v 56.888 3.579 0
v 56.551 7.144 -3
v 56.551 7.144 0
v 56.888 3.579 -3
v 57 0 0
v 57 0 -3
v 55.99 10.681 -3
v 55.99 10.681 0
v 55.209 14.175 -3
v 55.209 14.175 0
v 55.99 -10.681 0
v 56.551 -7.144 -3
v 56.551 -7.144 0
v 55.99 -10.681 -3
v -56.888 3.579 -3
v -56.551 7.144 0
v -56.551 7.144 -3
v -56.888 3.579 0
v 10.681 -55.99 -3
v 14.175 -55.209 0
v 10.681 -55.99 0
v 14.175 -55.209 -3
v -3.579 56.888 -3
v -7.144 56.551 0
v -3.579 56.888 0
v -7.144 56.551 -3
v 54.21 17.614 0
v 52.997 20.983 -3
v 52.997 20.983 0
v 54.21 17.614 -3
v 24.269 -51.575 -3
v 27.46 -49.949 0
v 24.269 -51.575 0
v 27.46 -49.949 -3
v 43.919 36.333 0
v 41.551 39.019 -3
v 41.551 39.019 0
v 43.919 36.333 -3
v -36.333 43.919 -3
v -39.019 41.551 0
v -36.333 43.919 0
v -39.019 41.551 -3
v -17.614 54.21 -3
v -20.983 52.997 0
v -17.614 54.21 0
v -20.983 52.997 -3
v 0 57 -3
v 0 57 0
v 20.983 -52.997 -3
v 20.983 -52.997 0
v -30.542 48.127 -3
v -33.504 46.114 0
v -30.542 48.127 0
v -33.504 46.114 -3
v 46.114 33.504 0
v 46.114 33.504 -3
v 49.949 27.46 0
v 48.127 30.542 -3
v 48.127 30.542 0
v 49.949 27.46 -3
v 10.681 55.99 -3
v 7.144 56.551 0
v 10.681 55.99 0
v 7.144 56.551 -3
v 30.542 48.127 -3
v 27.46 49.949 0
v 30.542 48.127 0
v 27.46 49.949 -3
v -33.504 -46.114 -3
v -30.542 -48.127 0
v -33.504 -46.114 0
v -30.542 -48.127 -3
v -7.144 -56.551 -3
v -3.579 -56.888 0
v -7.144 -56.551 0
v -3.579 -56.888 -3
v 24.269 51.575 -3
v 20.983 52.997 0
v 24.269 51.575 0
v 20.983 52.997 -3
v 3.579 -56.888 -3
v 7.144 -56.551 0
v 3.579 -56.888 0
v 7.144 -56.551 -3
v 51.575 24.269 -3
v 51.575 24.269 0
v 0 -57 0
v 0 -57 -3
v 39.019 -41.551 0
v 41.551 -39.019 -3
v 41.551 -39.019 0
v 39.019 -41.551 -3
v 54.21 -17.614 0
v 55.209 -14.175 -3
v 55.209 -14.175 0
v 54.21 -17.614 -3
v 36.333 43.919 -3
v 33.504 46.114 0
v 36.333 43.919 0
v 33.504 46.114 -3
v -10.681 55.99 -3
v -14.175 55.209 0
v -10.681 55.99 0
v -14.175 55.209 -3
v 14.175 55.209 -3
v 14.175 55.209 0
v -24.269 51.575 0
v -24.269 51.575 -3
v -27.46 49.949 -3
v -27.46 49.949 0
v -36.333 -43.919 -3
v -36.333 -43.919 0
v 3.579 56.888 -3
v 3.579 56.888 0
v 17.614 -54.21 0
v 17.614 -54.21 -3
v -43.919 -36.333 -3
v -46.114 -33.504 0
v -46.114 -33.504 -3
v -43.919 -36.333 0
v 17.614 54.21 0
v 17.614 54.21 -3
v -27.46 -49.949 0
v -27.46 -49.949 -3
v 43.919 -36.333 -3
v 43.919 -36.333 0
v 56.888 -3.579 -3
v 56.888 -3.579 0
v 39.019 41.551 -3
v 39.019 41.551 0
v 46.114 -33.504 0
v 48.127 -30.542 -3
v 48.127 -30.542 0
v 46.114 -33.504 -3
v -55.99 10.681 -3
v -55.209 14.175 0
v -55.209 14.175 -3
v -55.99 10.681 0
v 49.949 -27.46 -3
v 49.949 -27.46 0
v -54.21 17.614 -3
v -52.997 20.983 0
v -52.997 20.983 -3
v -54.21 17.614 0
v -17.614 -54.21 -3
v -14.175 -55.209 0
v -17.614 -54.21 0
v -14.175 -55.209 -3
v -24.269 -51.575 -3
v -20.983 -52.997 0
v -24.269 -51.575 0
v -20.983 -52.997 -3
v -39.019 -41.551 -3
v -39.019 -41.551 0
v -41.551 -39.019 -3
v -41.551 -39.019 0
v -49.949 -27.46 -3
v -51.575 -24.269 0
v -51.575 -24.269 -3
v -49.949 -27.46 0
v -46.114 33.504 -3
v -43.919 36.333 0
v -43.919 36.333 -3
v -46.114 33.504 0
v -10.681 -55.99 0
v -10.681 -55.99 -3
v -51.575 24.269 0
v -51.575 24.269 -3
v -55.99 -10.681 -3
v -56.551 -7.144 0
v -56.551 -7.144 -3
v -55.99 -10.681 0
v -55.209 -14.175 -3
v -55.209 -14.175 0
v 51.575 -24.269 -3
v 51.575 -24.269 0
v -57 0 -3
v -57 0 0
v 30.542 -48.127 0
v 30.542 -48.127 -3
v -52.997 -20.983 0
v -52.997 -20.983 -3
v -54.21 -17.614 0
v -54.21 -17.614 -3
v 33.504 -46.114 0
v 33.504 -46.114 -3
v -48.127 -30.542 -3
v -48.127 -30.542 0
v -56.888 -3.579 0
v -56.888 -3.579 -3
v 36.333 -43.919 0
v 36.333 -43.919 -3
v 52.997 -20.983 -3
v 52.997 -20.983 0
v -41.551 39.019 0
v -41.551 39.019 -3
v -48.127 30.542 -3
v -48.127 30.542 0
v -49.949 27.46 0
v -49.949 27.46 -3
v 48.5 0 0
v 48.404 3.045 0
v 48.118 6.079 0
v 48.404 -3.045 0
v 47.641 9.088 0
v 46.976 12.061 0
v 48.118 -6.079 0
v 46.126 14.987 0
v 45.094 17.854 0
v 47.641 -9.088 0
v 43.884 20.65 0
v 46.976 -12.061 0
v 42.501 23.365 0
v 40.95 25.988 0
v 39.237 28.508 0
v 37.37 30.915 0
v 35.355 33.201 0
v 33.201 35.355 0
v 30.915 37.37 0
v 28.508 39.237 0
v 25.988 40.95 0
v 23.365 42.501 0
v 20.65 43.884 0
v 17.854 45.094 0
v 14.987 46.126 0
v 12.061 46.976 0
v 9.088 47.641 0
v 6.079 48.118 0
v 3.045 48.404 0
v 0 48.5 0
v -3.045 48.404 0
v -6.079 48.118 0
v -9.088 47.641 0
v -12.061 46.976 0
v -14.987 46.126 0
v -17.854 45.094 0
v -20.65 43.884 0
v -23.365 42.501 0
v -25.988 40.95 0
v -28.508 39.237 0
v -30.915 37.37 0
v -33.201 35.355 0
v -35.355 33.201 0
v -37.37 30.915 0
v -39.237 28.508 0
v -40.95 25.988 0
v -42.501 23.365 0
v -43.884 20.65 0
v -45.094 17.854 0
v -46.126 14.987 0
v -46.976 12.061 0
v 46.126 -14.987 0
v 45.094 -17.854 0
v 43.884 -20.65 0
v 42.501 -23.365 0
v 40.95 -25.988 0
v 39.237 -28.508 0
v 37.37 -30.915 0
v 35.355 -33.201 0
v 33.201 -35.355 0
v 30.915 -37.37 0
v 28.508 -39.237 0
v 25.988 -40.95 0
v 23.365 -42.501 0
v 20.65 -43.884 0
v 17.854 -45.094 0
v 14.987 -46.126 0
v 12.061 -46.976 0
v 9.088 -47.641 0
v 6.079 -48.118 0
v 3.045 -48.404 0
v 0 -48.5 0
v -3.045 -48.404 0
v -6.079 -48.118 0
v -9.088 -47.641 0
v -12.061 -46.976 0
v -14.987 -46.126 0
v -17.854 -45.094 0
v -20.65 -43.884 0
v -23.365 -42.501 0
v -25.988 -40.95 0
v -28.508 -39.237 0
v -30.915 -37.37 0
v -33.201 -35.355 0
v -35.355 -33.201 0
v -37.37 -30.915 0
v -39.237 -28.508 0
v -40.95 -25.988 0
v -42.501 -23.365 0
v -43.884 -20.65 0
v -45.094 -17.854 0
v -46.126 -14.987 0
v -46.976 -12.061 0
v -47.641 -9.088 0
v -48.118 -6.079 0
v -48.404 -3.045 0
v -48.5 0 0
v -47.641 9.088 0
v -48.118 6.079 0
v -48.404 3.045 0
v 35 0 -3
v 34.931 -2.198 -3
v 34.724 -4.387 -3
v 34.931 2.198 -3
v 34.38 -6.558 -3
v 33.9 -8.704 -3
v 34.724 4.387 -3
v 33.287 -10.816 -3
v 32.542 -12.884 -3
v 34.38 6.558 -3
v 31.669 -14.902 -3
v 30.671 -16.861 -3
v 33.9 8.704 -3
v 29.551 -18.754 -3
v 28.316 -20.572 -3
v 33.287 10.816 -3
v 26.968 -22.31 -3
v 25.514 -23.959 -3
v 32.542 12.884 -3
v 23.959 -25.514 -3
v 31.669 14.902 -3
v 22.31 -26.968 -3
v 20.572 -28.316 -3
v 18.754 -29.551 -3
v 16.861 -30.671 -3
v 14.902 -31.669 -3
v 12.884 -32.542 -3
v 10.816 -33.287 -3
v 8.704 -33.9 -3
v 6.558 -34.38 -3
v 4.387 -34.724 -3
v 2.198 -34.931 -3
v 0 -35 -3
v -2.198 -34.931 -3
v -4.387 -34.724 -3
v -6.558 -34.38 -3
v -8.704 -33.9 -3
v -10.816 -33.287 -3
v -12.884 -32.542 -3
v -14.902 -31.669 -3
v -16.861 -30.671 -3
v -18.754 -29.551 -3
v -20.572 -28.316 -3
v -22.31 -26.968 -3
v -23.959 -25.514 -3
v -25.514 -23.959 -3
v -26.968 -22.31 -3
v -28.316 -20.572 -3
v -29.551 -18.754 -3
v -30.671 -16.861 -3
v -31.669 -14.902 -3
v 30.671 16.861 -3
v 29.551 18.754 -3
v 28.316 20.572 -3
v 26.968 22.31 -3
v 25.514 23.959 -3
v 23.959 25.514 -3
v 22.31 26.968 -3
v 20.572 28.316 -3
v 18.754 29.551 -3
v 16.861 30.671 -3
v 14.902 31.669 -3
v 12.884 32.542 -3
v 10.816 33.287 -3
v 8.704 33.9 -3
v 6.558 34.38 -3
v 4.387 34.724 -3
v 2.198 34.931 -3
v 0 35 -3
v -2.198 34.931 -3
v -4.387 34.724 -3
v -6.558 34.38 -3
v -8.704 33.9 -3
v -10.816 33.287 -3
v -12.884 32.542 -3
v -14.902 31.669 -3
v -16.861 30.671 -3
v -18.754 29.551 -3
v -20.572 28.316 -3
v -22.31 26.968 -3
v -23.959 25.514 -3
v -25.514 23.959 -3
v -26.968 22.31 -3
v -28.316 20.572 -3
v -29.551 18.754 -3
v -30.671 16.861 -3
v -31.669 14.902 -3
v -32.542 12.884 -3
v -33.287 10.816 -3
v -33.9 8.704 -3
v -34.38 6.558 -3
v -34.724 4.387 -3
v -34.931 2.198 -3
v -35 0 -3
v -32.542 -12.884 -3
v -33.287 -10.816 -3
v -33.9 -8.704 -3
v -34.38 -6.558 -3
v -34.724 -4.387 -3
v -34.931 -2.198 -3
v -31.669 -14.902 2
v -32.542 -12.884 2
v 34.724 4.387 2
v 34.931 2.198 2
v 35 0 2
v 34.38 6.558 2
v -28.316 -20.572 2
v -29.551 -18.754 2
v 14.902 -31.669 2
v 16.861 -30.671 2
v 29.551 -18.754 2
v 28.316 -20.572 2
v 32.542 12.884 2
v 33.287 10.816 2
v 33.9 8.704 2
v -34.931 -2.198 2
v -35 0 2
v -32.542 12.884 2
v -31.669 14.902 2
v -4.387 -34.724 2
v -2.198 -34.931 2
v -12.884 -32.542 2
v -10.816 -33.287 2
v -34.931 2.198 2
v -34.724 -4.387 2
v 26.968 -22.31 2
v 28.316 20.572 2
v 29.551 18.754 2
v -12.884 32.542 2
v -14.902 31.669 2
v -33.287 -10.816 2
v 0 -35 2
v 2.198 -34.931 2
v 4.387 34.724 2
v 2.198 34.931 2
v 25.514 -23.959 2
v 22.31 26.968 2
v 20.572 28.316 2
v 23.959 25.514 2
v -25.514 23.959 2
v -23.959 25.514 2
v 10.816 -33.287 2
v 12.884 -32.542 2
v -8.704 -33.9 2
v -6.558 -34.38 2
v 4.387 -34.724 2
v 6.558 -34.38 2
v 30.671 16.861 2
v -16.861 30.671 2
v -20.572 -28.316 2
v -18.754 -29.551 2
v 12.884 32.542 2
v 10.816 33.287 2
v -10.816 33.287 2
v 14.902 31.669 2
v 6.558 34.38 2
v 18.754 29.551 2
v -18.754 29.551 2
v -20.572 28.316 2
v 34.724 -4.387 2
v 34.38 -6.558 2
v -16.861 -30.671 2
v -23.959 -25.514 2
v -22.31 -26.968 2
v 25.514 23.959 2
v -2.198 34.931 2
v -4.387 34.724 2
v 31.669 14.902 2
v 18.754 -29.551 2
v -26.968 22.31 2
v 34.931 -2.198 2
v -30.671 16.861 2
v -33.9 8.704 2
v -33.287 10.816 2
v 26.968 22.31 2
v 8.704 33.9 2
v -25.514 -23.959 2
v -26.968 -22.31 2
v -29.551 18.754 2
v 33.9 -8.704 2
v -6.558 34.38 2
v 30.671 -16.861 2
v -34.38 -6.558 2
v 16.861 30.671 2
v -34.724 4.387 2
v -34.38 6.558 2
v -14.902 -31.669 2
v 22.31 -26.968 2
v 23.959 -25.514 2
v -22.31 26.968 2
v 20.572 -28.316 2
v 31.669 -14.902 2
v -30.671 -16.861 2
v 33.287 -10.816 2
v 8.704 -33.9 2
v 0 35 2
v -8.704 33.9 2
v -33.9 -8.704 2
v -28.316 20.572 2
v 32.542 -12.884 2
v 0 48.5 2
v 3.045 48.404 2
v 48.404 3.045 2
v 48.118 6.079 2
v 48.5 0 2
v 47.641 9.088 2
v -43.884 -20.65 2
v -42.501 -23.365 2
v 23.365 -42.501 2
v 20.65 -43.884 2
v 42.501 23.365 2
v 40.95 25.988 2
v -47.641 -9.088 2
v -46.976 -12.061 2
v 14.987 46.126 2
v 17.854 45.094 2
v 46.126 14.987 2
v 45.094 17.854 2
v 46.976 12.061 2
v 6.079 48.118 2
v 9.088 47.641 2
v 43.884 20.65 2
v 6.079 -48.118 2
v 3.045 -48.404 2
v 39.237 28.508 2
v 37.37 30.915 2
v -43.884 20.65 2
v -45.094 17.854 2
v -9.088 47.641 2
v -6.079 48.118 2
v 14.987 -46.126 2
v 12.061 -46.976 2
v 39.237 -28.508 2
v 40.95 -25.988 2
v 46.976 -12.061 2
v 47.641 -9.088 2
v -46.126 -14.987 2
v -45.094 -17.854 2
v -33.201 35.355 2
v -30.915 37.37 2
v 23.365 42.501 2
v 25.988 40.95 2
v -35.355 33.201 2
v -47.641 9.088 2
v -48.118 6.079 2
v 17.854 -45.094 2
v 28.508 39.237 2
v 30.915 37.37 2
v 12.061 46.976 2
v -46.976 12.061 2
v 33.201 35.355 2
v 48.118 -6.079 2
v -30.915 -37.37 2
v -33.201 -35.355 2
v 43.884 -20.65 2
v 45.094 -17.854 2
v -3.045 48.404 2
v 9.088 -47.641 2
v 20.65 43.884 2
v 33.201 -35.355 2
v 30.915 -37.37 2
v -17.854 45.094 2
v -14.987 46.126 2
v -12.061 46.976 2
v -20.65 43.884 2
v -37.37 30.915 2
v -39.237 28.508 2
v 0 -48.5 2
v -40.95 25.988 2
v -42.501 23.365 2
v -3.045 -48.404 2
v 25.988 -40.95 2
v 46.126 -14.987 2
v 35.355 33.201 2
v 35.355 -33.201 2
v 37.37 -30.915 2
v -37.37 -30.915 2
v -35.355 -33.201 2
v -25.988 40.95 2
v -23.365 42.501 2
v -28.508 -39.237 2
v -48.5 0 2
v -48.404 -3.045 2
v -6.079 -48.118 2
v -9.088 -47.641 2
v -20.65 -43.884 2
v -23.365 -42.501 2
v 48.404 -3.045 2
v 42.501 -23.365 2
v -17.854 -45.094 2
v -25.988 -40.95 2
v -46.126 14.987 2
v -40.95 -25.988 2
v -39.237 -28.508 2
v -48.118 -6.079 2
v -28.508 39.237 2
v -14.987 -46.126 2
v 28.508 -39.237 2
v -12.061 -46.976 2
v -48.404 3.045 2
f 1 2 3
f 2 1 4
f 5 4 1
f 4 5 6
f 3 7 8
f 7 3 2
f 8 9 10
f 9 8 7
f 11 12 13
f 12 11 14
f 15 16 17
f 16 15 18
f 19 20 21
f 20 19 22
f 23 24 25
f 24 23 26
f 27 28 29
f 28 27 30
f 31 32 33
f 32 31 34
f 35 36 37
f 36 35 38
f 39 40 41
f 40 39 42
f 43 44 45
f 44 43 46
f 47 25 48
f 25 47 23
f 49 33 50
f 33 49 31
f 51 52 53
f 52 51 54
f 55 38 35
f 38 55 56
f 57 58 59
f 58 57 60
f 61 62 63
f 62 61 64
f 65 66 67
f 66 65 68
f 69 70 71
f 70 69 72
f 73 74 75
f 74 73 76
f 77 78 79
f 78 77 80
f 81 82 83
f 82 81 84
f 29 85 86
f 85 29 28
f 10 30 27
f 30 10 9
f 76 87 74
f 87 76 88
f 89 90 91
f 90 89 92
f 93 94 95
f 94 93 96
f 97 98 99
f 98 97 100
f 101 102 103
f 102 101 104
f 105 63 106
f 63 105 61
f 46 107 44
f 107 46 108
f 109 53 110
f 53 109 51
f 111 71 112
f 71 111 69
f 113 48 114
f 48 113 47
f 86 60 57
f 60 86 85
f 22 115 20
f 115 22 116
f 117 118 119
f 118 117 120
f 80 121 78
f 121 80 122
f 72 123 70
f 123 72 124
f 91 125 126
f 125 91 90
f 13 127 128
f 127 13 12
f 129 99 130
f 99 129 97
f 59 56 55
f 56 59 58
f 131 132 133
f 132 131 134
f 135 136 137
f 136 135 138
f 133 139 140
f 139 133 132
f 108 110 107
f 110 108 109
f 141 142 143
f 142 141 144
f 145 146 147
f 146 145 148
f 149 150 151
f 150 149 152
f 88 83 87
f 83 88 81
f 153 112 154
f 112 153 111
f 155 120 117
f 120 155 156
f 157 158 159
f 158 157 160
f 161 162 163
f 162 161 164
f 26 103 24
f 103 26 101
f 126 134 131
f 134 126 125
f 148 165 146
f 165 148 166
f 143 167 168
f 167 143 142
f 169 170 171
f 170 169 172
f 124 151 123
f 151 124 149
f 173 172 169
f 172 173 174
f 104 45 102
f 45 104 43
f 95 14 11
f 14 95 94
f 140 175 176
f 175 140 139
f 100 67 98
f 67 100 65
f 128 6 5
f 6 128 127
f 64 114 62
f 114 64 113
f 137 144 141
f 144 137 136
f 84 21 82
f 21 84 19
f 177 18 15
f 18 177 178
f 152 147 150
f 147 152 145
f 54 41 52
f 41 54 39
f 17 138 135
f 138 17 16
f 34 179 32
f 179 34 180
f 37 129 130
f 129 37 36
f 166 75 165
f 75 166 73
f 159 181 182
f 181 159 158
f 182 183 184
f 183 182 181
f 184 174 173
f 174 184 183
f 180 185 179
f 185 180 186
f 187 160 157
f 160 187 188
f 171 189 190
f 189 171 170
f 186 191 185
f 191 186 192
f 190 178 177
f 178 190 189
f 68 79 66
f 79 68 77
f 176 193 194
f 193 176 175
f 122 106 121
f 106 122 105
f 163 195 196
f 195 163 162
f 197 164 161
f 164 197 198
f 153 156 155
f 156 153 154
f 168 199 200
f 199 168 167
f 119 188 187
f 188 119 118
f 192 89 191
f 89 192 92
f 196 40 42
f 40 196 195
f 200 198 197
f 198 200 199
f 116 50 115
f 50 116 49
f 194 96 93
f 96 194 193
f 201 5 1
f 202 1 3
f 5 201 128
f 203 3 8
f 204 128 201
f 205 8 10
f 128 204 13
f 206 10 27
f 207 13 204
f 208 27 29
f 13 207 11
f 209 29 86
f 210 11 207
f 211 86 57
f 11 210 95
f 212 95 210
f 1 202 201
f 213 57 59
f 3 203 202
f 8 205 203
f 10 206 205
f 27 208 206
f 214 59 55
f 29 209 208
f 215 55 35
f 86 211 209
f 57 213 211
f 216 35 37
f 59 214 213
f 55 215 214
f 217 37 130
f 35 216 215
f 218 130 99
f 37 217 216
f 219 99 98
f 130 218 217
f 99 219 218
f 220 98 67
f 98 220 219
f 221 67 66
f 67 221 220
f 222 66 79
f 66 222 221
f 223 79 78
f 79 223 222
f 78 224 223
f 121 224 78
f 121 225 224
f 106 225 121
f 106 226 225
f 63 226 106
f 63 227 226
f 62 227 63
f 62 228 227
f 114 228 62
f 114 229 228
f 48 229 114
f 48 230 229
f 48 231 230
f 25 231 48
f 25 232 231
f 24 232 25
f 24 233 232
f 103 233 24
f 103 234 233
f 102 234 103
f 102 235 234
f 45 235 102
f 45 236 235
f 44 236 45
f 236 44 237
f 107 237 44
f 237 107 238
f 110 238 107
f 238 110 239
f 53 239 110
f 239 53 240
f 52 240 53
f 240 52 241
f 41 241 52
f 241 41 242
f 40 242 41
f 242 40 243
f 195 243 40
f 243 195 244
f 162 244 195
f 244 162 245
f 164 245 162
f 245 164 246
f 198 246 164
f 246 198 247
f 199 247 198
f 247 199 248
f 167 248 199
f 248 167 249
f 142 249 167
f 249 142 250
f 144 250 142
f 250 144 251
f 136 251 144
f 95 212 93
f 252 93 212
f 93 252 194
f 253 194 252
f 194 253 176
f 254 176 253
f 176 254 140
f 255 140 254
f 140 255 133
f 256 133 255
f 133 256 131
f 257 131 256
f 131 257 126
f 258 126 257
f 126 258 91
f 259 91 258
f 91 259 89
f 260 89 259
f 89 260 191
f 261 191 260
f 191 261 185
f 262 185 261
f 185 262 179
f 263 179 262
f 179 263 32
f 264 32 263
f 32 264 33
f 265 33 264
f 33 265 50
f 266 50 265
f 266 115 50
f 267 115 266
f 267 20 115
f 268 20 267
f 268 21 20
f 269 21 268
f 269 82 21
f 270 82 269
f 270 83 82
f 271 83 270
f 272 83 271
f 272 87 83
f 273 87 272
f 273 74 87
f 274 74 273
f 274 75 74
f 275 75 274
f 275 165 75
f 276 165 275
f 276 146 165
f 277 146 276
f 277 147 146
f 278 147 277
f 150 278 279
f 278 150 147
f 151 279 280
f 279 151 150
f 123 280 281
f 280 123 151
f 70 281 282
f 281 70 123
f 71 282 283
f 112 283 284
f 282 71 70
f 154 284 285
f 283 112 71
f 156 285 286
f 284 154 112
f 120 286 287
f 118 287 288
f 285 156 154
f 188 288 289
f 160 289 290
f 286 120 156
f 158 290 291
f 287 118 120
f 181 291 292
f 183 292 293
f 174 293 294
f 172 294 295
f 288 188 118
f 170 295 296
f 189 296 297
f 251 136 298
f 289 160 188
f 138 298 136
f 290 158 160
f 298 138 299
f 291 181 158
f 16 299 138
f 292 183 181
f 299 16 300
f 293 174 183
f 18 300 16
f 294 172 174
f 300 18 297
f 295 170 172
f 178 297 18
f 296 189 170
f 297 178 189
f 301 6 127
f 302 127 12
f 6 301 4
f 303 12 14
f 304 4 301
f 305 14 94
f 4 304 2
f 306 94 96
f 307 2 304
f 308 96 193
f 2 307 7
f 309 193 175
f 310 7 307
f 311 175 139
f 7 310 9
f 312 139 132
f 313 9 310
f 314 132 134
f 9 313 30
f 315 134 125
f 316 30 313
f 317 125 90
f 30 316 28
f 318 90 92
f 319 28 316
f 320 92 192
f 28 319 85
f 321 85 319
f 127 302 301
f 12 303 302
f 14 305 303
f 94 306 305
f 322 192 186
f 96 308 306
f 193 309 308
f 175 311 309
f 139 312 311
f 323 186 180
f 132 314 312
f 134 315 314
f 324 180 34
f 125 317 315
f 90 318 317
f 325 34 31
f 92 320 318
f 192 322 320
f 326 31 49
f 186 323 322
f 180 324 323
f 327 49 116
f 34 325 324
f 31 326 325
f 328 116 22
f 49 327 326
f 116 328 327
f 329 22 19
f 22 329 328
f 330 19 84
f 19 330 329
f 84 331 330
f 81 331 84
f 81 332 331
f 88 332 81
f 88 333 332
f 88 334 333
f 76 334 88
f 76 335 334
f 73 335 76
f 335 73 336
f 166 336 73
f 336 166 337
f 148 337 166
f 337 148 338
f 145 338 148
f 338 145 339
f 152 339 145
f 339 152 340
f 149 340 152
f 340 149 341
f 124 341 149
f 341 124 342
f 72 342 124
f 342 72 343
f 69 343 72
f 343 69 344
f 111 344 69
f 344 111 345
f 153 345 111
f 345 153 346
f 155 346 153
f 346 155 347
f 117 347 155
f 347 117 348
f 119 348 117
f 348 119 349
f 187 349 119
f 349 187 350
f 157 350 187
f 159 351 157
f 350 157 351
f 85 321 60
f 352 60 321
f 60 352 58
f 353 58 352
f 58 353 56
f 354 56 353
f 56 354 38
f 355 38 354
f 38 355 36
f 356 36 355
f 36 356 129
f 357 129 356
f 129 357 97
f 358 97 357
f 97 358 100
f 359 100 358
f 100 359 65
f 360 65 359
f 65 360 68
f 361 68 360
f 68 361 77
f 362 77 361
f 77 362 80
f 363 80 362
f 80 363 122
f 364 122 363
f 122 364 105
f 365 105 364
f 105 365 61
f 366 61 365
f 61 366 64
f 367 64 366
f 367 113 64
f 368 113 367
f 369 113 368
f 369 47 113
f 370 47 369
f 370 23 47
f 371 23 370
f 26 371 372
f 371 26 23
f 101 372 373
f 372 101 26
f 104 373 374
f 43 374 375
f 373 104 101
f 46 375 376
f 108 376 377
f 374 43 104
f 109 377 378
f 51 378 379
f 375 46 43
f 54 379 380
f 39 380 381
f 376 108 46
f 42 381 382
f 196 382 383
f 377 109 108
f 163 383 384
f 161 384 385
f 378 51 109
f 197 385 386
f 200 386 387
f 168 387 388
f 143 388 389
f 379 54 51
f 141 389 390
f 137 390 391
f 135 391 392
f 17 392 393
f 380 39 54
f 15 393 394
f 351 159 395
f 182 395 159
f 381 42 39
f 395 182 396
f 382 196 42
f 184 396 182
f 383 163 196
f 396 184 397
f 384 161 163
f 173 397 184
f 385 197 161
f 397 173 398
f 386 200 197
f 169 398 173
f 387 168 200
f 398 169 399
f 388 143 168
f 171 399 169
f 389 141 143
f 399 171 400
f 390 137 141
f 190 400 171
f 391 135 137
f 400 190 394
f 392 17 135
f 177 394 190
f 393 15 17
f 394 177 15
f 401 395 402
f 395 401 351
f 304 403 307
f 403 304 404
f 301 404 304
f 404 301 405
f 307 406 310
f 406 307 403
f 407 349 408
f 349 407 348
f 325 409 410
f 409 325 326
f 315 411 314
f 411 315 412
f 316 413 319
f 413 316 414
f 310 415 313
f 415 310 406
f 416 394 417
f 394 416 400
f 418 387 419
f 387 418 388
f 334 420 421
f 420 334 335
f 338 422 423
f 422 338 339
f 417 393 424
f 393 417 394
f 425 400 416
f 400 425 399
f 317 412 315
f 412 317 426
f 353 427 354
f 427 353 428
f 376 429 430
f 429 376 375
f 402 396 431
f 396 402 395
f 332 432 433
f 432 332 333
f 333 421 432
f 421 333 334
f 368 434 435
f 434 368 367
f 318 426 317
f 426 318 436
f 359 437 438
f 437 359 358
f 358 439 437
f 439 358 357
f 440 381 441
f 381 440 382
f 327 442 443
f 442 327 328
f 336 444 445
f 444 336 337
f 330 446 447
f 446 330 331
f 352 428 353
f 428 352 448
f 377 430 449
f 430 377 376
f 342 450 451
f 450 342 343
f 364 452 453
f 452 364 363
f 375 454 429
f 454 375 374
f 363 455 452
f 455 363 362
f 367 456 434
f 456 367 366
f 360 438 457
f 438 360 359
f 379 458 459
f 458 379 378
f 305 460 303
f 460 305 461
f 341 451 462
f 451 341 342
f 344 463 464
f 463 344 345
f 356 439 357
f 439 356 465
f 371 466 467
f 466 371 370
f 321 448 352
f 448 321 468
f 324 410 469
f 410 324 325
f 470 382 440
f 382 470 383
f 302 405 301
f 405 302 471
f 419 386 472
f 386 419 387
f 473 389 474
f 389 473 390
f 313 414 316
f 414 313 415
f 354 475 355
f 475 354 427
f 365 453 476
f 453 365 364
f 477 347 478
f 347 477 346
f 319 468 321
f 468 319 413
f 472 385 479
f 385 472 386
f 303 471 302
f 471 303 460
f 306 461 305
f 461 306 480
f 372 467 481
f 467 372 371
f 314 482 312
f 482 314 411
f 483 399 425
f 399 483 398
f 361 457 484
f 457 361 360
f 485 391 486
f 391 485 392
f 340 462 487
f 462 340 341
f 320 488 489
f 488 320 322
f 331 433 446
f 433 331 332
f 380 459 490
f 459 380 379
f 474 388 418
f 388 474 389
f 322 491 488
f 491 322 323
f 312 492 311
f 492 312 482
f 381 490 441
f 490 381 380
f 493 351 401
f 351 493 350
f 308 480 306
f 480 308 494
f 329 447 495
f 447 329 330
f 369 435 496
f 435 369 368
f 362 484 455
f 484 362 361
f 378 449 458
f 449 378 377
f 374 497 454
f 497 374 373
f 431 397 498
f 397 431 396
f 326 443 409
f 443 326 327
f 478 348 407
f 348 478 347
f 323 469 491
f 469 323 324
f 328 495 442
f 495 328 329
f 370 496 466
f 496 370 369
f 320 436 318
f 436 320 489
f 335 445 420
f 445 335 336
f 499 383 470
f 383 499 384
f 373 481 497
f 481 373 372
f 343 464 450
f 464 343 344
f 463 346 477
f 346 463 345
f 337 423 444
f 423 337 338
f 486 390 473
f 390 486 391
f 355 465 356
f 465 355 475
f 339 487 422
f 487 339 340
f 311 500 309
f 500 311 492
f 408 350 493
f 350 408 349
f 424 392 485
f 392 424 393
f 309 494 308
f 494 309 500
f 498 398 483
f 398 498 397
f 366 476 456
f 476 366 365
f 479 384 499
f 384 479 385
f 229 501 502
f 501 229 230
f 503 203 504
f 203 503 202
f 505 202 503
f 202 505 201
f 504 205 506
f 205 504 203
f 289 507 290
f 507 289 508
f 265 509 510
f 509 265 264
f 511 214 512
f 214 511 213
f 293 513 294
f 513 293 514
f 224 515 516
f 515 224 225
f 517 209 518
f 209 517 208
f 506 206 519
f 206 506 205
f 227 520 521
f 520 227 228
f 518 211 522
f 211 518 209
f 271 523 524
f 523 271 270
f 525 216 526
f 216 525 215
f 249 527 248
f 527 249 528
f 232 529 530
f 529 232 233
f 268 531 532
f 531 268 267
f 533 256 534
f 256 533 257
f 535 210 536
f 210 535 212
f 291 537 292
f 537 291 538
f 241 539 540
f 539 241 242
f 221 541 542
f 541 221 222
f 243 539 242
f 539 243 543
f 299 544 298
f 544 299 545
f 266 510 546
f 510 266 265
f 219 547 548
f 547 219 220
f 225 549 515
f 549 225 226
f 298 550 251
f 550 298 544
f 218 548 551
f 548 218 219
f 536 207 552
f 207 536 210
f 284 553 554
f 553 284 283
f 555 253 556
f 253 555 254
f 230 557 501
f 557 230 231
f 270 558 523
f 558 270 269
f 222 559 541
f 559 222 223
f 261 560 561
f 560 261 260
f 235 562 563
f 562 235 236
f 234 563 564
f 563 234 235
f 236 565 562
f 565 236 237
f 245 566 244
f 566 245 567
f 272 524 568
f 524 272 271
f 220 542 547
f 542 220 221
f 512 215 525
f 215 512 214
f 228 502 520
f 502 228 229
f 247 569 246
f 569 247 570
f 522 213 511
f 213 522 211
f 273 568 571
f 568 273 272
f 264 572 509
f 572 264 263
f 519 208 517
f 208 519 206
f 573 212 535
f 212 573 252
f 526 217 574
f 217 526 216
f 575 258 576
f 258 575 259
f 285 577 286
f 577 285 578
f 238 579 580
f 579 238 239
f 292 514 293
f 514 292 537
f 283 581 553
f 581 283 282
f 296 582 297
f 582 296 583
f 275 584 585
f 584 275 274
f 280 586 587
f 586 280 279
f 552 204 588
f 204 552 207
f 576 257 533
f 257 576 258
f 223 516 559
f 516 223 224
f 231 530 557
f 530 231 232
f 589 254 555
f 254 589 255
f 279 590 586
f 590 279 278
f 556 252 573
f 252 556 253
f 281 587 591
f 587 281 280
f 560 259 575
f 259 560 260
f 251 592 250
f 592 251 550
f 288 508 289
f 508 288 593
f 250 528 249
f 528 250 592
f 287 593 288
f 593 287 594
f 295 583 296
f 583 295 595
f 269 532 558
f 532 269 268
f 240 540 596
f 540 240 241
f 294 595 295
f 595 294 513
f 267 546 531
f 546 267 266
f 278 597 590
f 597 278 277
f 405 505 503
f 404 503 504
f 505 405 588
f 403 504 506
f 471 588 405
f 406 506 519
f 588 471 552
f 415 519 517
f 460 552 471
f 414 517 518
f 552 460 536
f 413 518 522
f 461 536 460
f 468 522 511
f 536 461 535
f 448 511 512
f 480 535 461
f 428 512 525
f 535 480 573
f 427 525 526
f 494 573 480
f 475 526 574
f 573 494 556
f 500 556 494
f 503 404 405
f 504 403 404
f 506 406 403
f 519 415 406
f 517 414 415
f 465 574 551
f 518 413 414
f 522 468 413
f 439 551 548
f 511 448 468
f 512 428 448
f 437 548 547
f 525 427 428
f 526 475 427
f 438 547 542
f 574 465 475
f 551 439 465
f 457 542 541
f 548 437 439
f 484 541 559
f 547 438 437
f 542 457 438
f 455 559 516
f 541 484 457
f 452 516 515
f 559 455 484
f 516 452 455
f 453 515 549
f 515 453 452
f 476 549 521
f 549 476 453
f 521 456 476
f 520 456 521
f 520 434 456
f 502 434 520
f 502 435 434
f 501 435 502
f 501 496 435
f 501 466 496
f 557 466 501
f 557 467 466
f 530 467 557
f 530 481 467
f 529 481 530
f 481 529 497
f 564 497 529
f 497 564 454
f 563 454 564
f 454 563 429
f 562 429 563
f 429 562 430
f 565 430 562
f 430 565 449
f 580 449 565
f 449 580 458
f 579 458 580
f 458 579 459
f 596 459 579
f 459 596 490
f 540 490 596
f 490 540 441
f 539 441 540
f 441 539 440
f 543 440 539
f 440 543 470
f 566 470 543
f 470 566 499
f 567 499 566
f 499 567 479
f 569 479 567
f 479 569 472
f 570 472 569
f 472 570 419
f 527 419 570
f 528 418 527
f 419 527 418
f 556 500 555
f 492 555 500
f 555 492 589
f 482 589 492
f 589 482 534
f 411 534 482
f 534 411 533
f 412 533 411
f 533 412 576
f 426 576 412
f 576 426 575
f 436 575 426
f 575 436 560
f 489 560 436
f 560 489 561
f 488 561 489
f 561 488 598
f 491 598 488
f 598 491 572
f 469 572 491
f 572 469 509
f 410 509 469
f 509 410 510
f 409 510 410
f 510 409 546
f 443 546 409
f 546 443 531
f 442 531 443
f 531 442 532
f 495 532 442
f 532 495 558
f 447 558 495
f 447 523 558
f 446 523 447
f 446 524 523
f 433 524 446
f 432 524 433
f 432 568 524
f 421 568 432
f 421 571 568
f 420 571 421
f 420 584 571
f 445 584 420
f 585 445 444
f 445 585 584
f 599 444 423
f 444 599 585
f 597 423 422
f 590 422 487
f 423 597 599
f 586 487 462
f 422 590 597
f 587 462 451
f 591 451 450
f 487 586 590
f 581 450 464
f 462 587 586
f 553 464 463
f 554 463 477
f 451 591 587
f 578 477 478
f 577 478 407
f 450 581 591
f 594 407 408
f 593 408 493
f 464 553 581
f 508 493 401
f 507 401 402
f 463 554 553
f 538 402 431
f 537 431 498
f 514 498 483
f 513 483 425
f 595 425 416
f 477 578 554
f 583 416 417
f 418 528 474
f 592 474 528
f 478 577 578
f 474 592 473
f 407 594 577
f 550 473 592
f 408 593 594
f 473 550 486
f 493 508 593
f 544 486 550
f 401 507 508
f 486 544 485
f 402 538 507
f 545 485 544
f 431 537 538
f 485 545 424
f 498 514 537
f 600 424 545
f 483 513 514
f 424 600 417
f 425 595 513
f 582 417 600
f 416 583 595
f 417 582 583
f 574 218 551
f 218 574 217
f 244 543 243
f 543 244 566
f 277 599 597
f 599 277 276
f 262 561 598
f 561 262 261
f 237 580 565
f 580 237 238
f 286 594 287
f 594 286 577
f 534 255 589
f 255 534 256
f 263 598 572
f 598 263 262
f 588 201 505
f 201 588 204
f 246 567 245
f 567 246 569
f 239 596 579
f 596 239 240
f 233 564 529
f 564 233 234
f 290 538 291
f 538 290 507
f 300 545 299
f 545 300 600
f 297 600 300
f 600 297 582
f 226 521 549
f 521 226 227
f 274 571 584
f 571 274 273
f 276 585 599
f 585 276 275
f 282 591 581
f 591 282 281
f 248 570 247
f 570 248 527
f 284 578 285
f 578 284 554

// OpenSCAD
/*

 Copyright (C) 2014 Robert Kaye
 Creative Commons License 3.0 BY-SA

 This coffee cup shim can be customized!

 Adjust the following values to fit the cups/coffee equipment you have.
*/

// The outer (plate) diameter of the shim. This should a few mm wider than your coffee cups:
plate_dia = 114; // mm

// The outer diameter of the ridge that fits inside the coffee cup:
ridge_dia = 97; // mm

// The inner diameter of the shim. This should be a few mm larger than the outer diameter of
// your coffee filter cone or Aeropress:
inner_dia = 70; // mm

// How thick the main plate should be. 3mm seems sturdy.
plate_thickness = 3;

// How thick the ridge on the main plate should be. 2mm keeps it from sliding off the cup
ridge_thickness = 2;

// The number of facets to use to render the cylinders. 25 is good for tinkering, 100+ for a final part.
facets = 100;

// No need to edit below this line -------
plate_r = plate_dia / 2;
ridge_r = ridge_dia / 2;
inner_r = inner_dia / 2;

union()
{
	translate([0,0,-plate_thickness])
		upper_cylinder();
    lower_cylinder();
}

module upper_cylinder()
{
	difference()
	{
		cylinder(h = plate_thickness, r = plate_r, $fn=facets);
		cylinder(h = plate_thickness, r = inner_r, $fn=facets);
	}; 
}

module lower_cylinder()
{
    	difference()
	{
		cylinder(h = ridge_thickness, r = ridge_r, $fn=facets);
		cylinder(h = ridge_thickness, r = inner_r, $fn=facets);
	};
}
